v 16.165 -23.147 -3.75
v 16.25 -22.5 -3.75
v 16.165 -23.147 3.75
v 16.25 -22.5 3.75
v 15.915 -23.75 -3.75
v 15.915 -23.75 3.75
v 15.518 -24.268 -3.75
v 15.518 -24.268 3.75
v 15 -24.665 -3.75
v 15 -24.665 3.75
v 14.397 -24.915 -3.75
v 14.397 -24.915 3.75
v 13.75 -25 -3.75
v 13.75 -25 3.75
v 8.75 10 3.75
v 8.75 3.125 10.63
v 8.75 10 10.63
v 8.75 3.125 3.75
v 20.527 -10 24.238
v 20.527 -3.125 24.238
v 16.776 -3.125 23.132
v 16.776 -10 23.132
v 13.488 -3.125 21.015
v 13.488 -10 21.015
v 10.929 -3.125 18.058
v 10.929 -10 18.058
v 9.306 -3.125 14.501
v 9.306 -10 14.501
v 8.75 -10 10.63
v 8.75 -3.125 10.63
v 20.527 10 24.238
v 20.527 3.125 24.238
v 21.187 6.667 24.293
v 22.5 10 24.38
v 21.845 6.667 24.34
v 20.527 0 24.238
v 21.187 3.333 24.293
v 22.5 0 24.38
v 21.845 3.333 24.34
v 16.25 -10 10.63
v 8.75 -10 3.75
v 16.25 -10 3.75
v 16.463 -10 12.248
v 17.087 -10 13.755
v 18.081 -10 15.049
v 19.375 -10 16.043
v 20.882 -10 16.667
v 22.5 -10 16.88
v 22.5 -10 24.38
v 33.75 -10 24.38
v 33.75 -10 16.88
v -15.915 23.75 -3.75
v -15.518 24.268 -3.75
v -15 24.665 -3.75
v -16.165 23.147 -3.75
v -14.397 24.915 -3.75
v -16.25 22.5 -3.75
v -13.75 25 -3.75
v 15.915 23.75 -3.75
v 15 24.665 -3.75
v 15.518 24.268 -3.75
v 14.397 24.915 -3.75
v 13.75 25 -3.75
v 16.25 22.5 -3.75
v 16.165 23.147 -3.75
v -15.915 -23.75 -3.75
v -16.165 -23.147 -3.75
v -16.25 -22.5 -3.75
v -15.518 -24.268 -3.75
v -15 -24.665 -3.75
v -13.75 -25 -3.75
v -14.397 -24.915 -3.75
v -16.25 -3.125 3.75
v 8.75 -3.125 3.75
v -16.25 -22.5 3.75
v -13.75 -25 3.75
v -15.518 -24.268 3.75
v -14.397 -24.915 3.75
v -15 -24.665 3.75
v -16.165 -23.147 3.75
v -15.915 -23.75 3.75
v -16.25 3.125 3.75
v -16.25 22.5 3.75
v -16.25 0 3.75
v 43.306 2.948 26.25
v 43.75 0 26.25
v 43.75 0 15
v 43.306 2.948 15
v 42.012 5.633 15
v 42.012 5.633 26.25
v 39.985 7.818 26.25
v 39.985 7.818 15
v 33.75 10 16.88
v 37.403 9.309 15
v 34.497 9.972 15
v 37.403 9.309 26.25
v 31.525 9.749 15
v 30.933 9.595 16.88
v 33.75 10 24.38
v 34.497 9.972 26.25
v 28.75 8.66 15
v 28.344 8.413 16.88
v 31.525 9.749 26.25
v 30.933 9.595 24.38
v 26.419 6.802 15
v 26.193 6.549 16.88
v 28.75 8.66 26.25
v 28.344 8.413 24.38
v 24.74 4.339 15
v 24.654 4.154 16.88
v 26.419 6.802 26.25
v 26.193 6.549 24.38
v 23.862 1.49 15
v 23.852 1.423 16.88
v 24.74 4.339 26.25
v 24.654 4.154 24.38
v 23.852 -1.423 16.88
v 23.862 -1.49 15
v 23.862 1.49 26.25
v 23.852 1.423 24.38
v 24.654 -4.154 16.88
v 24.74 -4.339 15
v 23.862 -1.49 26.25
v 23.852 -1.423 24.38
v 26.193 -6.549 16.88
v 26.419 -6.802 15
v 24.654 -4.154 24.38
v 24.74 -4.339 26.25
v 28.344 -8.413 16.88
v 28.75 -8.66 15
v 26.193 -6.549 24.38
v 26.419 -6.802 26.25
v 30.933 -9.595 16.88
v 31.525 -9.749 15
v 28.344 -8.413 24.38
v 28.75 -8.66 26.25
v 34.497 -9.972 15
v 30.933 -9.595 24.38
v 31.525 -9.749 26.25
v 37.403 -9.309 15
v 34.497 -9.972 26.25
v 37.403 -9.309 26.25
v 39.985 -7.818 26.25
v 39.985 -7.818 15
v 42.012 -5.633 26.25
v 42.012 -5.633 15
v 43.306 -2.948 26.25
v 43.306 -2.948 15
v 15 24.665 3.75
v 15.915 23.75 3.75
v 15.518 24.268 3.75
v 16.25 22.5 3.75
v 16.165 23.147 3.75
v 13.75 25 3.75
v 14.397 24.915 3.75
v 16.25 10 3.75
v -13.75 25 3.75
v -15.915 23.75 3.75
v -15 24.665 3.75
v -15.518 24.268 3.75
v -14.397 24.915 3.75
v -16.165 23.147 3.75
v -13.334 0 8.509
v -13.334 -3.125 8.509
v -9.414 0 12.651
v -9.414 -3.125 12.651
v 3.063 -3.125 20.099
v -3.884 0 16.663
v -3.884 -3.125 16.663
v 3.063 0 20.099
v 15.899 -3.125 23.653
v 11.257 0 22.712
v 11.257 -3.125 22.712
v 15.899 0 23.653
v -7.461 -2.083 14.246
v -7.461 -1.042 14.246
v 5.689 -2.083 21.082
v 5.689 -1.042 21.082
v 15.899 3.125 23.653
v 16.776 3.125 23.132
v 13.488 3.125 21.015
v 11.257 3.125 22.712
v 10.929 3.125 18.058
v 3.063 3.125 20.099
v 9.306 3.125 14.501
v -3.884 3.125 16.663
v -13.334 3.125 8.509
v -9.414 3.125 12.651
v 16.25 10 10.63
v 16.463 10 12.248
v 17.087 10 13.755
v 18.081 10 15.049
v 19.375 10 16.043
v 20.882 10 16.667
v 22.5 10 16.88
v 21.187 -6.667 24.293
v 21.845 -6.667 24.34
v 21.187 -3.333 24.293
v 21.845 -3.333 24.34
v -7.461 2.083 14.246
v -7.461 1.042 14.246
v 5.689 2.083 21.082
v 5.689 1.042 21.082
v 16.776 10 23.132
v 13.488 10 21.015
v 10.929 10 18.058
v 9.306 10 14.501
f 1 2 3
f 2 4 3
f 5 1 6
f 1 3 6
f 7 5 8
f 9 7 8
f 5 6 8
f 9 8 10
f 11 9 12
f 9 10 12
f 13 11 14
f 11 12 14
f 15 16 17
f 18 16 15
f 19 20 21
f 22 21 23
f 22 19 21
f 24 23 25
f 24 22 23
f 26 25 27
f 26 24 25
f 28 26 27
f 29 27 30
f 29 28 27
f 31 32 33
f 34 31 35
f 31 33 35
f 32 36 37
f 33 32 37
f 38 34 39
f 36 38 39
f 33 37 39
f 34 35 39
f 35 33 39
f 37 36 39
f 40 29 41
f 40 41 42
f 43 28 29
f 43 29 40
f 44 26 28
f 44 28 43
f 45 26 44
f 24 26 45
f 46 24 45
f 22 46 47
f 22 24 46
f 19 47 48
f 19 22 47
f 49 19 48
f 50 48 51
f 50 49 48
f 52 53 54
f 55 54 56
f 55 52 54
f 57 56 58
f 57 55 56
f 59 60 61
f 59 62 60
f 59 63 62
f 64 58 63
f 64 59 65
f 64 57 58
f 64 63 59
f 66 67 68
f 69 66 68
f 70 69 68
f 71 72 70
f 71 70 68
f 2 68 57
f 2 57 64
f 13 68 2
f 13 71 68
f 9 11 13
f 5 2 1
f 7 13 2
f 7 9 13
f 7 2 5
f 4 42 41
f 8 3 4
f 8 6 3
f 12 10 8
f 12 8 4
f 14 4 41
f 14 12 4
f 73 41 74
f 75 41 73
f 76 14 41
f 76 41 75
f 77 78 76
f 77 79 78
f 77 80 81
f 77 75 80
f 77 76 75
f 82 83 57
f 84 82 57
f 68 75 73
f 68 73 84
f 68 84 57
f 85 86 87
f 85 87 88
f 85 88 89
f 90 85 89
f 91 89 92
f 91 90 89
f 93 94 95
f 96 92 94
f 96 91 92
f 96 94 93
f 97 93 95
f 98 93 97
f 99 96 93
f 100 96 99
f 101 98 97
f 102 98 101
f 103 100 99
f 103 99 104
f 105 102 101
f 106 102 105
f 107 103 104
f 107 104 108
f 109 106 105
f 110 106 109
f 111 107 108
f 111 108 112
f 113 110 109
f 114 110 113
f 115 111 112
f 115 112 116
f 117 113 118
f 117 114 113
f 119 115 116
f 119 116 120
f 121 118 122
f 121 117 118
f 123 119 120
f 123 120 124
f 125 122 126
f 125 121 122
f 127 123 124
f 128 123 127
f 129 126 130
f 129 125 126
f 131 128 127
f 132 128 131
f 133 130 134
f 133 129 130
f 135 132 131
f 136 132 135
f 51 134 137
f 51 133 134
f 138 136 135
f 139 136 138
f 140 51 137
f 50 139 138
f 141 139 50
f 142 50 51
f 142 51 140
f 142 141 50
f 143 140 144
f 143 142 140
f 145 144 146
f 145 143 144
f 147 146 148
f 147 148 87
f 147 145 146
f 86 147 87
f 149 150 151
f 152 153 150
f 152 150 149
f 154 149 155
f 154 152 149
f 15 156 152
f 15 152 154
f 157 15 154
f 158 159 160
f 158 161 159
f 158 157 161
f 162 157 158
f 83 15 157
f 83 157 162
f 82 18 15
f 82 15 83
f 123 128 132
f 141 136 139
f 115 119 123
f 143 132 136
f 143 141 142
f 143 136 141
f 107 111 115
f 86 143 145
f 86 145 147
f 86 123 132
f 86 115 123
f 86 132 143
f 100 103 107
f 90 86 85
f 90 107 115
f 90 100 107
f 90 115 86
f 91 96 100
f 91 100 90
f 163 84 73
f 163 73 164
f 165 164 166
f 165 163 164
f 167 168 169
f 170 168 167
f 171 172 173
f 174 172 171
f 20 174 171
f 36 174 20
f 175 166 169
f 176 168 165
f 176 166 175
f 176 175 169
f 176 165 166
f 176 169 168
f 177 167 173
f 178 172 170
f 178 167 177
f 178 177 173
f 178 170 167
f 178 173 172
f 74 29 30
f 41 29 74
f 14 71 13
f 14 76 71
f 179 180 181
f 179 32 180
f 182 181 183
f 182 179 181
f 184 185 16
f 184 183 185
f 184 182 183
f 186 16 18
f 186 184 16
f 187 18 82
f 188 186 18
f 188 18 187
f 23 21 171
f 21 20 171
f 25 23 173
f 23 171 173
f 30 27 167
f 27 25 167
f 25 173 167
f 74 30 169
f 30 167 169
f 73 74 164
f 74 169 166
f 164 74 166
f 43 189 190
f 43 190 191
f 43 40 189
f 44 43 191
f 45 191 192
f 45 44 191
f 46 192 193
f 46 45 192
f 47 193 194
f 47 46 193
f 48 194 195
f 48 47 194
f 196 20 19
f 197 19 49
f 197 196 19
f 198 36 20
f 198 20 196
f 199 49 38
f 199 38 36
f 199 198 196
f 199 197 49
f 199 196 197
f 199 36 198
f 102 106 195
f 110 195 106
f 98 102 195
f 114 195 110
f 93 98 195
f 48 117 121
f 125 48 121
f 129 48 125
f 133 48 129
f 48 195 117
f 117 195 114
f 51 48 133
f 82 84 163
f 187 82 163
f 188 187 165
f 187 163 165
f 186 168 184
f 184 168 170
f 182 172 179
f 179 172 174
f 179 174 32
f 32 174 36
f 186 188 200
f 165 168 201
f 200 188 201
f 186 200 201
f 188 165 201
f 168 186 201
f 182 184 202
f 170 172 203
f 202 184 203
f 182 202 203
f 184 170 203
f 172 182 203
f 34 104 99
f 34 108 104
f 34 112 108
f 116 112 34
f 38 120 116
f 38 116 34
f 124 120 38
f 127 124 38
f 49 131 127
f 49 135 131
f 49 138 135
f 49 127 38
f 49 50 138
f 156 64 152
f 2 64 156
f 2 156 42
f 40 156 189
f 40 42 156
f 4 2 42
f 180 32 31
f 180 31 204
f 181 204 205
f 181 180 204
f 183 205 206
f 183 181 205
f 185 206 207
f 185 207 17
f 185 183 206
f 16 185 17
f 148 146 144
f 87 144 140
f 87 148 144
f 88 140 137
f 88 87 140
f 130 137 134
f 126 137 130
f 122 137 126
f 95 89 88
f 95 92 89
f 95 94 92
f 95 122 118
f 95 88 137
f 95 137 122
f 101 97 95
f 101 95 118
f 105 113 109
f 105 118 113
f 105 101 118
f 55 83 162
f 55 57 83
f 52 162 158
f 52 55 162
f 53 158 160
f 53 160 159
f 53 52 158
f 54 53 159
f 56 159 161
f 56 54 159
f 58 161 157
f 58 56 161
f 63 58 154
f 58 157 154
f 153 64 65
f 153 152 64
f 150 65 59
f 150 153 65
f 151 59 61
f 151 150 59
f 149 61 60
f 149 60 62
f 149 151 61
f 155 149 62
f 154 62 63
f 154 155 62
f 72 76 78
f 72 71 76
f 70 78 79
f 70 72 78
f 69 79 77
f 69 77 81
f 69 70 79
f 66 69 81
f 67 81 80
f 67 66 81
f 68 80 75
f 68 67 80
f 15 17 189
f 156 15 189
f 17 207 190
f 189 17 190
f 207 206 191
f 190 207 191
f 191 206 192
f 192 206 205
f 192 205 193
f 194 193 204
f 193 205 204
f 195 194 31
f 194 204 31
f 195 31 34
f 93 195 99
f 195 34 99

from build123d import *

# Parameters (mm, degrees)
F1_DEPTH = 25
F0_W     = 10
F0_H     = 7.5
F2_DEPTH = 10
F3_DEPTH = 3.125
F5_R     = 2.5


with BuildPart() as f1:
    # F0 (on Front) → F1 (new body, symmetric)
    with BuildSketch(Plane.XZ):
        Polygon((-16.25, -3.75), (16.25, -3.75), (16.25, 3.75), (8.75, 3.75), (-16.25, 3.75), align=None)
    extrude(amount=F1_DEPTH, both=True)

    # F0 (on Front) → F2 (join, symmetric)
    with BuildSketch(Plane.XZ):
        with Locations((28.75, 20.63)):
            Rectangle(F0_W, F0_H)
        with BuildLine():
            Line((8.75, 3.75), (16.25, 3.75))
            Line((16.25, 3.75), (16.25, 10.63))
            ThreePointArc((16.25, 10.63), (18.080583, 15.049417), (22.5, 16.88))
            Line((22.5, 16.88), (23.75, 16.88))
            Line((23.75, 16.88), (23.75, 24.38))
            Line((23.75, 24.38), (22.5, 24.38))
            add(Edge.make_bspline(
                [(20.527115, 24.237727), (21.188051, 24.296236), (21.846037, 24.343663), (22.5, 24.38)],
                knots=[42.021678, 42.021678, 42.021678, 42.021678, 43.899424, 43.899424, 43.899424, 43.899424], degree=3))
            ThreePointArc((20.527115, 24.237727), (12.103133, 19.628204), (8.75, 10.63))
            Line((8.75, 10.63), (8.75, 3.75))
        make_face()
    extrude(amount=F2_DEPTH, both=True)

    # F0 (on Front) → F3 (join, symmetric)
    with BuildSketch(Plane.XZ):
        with BuildLine():
            add(Edge.make_bspline(
                [(-16.25, 3.75), (-10.531949, 16.068907), (5.736173, 22.928358), (20.527115, 24.237727)],
                knots=[0, 0, 0, 0, 42.021678, 42.021678, 42.021678, 42.021678], degree=3))
            Line((-16.25, 3.75), (8.75, 3.75))
            Line((8.75, 3.75), (8.75, 10.63))
            ThreePointArc((8.75, 10.63), (12.103133, 19.628204), (20.527115, 24.237727))
        make_face()
    extrude(amount=F3_DEPTH, both=True)

    # F0 (on Front) → F4 (revolve)
    with BuildSketch(Plane.XZ):
        Polygon((33.75, 24.38), (33.75, 16.88), (33.75, 15), (43.75, 15), (43.75, 26.25), (33.75, 26.25), align=None)
    revolve(axis=Axis((33.75, 0, 20.625), (0, 0, 1)))

    # F5
    f5_edges = [f1.edges().sort_by_distance(p)[0] for p in [
        (16.25, -25, 0),
        (-16.25, -25, 0),
        (16.25, 25, 0),
        (-16.25, 25, 0),
    ]]
    fillet(f5_edges, radius=F5_R)


solid = f1.part
